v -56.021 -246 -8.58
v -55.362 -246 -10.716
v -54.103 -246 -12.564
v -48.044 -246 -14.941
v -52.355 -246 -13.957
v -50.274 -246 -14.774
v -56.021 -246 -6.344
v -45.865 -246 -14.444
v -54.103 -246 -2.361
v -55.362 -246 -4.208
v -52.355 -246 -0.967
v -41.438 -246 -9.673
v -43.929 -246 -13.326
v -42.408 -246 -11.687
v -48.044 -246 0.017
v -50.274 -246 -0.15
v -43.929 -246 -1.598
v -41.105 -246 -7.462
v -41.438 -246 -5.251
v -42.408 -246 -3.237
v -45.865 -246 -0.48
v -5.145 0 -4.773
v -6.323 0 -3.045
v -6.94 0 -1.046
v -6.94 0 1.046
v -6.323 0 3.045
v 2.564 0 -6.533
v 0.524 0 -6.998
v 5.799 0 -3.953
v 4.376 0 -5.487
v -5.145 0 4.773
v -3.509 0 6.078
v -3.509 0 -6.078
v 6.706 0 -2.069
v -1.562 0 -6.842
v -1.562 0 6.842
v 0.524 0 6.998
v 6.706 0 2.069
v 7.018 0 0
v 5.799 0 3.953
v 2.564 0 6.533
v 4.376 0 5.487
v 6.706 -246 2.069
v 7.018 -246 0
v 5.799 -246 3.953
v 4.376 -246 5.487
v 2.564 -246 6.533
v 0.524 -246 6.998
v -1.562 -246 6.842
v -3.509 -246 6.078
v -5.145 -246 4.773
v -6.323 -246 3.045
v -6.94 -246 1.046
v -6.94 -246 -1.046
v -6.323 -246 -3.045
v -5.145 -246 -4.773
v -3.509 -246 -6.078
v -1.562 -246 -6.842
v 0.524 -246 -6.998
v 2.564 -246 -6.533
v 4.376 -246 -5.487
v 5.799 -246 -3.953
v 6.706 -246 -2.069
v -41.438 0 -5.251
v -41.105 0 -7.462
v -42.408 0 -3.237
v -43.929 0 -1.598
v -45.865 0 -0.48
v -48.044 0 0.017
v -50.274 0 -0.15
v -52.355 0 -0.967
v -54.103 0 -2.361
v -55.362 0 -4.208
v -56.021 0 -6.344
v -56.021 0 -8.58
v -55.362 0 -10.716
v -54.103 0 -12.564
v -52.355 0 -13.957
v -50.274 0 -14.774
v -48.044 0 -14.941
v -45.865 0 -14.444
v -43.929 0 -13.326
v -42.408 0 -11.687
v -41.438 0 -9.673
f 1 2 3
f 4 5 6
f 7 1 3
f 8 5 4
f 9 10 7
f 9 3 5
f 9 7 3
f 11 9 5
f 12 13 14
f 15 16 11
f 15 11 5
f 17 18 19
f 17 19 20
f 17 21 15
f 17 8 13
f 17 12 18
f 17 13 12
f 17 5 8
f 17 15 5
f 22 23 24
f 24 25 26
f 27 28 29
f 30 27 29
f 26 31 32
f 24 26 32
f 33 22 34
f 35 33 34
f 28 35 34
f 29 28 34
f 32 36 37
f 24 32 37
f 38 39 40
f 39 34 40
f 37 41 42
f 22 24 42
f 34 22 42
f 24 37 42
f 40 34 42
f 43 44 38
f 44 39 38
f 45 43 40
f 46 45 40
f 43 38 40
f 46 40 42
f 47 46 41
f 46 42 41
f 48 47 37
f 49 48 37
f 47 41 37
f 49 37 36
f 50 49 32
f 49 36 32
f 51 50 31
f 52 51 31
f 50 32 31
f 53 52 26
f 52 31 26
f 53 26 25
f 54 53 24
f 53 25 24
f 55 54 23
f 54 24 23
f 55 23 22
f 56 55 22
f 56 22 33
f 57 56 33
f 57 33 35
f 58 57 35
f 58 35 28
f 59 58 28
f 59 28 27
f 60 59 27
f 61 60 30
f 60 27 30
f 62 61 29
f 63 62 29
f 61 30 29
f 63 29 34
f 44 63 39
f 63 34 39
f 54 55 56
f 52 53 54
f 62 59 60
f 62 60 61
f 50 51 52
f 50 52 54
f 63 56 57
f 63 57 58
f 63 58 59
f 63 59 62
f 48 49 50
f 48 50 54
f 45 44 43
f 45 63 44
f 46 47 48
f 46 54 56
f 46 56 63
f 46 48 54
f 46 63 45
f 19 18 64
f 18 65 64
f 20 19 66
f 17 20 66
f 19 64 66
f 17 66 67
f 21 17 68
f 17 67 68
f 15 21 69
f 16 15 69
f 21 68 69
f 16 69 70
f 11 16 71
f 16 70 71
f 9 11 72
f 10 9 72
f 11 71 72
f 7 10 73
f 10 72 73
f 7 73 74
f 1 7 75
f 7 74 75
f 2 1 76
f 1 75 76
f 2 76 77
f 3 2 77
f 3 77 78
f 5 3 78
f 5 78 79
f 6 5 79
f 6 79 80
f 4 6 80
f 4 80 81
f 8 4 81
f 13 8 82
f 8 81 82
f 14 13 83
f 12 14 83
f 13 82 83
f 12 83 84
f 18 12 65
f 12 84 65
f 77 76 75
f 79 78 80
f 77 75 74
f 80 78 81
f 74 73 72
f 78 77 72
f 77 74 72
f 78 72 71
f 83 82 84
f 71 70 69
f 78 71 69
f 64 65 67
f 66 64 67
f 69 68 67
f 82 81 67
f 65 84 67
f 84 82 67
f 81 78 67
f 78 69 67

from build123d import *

# Parameters (mm, degrees)
F0_R     = 7.0180252072
F1_DEPTH = 100
F2_R     = 7.5002480587
F3_DEPTH = 25
F4_DEPTH = 100
F5_DEPTH = 100
F6_DEPTH = 25
F7_DEPTH = 70
F8_DEPTH = 26
F9_DEPTH = 46


with BuildPart() as f1:
    # F0 (on Front) → F1 (new body)
    with BuildSketch(Plane.XZ):
        Circle(F0_R)
    extrude(amount=F1_DEPTH)

    # F5 (add): a face of the model
    f5_faces = [f1.faces().sort_by_distance(p)[0] for p in [
        (0, -100, 0),
    ]]
    extrude(f5_faces, amount=F5_DEPTH)

    # F9 (add): a face of the model
    f9_faces = [f1.faces().sort_by_distance(p)[0] for p in [
        (0, -200, 0),
    ]]
    extrude(f9_faces, amount=F9_DEPTH)


with BuildPart() as f3:
    # F2 (on Front) → F3 (new body)
    with BuildSketch(Plane.XZ):
        with Locations((-48.6049484462, -7.4620740644)):
            Circle(F2_R)
    extrude(amount=F3_DEPTH)

    # F4 (add): a face of the model
    f4_faces = [f3.faces().sort_by_distance(p)[0] for p in [
        (-48.6049484462, -25, -7.4620740644),
    ]]
    extrude(f4_faces, amount=F4_DEPTH)

    # F6 (add): a face of the model
    f6_faces = [f3.faces().sort_by_distance(p)[0] for p in [
        (-48.6049484462, -125, -7.4620740644),
    ]]
    extrude(f6_faces, amount=F6_DEPTH)

    # F7 (add): a face of the model
    f7_faces = [f3.faces().sort_by_distance(p)[0] for p in [
        (-48.6049484462, -150, -7.4620740644),
    ]]
    extrude(f7_faces, amount=F7_DEPTH)

    # F8 (add): a face of the model
    f8_faces = [f3.faces().sort_by_distance(p)[0] for p in [
        (-48.6049484462, -220, -7.4620740644),
    ]]
    extrude(f8_faces, amount=F8_DEPTH)


solid = Compound([f1.part, f3.part])
